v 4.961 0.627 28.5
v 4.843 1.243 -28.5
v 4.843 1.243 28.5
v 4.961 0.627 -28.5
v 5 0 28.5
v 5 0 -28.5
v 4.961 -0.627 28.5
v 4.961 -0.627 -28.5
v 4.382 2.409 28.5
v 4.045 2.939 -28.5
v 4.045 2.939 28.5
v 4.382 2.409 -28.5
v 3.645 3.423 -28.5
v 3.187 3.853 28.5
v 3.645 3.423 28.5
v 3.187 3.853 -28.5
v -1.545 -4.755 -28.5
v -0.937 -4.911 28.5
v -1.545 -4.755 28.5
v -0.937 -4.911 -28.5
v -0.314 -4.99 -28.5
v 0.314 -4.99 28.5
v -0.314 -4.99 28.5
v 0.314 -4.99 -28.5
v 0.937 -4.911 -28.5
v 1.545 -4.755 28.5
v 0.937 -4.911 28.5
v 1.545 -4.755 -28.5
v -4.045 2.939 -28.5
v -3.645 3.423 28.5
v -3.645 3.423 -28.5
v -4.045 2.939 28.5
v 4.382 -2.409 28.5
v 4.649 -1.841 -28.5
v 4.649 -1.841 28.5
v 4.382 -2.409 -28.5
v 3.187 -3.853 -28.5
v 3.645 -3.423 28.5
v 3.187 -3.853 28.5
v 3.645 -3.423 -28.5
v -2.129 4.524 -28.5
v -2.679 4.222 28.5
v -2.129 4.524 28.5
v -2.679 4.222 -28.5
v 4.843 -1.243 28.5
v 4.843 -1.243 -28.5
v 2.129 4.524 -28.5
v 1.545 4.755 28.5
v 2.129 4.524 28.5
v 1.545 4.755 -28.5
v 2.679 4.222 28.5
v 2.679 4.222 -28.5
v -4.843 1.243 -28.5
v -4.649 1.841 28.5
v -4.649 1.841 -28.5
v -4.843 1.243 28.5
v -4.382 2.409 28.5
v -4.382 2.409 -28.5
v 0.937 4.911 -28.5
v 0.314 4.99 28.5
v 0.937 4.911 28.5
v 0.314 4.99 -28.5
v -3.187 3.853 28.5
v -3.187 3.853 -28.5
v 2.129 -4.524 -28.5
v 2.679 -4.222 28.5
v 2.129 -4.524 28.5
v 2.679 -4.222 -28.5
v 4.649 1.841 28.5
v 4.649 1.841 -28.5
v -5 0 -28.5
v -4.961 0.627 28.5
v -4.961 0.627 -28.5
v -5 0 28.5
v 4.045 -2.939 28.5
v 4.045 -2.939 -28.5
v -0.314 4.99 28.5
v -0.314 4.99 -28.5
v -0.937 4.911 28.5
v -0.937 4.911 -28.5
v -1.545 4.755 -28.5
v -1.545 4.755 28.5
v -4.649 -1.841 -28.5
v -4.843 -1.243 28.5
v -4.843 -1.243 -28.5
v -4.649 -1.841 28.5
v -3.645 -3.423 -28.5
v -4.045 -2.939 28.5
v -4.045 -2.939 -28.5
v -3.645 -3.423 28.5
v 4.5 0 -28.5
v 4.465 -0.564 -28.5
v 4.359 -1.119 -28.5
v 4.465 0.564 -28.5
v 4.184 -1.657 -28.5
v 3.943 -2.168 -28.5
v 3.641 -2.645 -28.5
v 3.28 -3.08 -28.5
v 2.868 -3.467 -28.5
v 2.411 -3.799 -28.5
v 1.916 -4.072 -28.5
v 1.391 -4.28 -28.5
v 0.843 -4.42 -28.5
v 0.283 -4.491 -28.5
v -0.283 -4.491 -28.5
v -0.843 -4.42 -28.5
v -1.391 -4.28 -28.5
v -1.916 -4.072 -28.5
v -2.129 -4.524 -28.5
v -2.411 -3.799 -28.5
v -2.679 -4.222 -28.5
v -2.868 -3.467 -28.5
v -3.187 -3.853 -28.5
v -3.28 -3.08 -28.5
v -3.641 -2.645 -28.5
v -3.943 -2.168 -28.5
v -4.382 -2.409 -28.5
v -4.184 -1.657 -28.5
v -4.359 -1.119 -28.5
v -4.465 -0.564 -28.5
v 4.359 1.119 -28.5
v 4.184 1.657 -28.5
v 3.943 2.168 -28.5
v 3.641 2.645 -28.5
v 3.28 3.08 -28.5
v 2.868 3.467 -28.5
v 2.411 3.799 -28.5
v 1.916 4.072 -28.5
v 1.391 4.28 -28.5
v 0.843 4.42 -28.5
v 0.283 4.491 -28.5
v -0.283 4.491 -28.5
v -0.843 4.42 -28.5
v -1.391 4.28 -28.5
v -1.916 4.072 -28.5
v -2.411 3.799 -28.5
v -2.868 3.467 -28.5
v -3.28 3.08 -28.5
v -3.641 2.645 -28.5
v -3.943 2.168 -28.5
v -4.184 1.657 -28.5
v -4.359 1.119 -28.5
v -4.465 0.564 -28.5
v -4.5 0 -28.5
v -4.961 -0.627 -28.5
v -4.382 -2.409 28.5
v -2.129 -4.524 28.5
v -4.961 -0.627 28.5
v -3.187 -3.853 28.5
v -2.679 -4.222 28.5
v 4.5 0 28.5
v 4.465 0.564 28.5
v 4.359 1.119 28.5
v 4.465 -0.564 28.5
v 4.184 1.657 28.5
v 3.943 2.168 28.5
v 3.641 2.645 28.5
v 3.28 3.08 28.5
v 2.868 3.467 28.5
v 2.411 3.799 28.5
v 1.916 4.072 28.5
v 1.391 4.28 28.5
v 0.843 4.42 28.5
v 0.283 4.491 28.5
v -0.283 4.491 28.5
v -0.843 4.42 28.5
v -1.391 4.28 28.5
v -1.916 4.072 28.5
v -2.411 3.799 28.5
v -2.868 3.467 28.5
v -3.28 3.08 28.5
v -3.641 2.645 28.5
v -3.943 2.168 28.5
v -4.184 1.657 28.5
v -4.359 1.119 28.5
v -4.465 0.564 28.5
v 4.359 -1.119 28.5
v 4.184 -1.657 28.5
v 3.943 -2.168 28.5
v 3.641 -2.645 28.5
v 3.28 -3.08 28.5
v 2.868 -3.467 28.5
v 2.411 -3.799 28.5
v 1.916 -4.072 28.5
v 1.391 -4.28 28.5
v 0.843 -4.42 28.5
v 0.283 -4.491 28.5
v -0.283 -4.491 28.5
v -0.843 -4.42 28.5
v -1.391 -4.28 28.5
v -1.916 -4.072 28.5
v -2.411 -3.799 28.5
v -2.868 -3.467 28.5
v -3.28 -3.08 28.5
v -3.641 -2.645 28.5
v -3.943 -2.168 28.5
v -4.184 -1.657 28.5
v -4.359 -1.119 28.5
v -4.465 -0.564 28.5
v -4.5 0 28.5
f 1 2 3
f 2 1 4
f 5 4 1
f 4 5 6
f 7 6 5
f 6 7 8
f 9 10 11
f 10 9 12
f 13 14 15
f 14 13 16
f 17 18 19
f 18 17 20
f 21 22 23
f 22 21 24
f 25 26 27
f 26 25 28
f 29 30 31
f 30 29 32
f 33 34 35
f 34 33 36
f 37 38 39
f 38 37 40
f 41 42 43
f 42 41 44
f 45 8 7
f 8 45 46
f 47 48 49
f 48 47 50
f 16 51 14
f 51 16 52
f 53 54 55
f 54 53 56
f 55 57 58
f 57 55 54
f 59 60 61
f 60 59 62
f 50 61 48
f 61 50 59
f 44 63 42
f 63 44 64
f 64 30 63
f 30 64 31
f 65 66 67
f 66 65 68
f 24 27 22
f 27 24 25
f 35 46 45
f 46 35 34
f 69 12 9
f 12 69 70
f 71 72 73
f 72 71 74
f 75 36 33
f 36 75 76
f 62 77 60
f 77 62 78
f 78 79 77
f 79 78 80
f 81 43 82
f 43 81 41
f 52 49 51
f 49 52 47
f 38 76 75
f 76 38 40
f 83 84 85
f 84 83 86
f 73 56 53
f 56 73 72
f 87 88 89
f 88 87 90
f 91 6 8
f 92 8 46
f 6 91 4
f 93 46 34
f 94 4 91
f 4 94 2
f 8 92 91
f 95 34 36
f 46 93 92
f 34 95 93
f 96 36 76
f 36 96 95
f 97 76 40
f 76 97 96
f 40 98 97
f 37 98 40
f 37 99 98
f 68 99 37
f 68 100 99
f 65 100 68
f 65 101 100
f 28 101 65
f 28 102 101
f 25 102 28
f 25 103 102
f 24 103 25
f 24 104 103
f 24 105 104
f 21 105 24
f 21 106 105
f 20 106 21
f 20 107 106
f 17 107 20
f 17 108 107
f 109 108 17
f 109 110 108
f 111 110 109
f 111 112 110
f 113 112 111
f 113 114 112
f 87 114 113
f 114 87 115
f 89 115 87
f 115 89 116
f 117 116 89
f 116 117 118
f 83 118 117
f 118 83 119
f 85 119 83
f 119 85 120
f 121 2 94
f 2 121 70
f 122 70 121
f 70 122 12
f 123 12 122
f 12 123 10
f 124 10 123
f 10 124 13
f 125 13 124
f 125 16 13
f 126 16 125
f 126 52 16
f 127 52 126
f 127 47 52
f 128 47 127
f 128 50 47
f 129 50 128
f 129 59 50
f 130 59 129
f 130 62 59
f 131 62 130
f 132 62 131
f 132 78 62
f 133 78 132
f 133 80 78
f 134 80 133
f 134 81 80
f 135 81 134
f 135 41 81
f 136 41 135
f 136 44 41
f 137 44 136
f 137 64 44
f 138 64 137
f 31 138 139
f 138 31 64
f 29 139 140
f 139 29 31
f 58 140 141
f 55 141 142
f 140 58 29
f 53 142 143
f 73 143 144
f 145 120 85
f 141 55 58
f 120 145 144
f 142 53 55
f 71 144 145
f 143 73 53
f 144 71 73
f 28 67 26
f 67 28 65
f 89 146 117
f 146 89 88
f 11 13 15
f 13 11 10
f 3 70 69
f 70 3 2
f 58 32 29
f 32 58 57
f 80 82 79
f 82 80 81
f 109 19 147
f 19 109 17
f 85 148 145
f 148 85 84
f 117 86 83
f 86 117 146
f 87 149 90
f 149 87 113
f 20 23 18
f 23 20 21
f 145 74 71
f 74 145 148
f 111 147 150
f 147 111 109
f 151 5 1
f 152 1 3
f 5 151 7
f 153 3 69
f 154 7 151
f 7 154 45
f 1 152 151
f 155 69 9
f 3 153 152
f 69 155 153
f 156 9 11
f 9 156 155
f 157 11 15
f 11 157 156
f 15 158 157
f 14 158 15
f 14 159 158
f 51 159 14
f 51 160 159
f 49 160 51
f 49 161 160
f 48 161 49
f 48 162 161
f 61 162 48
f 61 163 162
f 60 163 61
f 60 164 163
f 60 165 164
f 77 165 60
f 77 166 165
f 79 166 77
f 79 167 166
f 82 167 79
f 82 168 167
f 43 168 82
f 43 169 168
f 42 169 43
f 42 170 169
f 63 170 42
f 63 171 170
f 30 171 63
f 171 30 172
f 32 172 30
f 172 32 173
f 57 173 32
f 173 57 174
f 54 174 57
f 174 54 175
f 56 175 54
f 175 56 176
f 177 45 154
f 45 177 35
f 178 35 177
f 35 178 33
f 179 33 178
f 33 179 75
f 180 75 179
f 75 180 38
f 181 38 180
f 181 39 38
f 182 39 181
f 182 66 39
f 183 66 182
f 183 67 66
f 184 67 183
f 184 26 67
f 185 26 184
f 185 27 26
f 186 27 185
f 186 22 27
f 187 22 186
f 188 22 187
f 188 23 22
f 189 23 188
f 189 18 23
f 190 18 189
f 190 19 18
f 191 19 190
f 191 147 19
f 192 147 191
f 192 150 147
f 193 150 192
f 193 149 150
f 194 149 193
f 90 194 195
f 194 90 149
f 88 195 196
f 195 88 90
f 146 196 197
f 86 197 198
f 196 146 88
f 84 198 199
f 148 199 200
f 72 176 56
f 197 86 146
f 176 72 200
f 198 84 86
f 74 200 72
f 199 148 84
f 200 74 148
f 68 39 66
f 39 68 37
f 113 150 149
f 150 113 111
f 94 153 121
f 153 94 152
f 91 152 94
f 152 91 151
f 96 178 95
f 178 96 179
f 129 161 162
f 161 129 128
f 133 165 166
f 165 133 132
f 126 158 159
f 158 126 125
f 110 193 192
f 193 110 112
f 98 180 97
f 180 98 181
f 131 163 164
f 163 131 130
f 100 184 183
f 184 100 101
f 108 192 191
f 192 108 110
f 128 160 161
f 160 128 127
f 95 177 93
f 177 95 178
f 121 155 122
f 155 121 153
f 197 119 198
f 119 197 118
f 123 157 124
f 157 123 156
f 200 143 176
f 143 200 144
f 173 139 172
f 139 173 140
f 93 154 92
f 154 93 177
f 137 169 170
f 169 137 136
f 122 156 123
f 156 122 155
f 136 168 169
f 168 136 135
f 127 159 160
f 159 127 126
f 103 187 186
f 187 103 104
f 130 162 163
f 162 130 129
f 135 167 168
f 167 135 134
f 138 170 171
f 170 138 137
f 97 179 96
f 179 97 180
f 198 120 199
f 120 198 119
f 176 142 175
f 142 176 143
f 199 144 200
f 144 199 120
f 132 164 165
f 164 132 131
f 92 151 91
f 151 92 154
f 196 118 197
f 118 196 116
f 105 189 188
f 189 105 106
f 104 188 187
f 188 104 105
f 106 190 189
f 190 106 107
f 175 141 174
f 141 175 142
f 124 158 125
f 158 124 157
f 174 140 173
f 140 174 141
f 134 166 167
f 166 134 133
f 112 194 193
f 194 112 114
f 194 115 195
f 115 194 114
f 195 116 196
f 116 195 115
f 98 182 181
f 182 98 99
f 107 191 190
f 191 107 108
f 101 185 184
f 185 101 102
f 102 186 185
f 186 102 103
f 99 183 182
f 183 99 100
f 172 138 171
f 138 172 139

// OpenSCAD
$fn = 50;


difference() {
	union() {
		translate(v = [0, 0, -28.5000000000]) {
			cylinder(h = 57, r = 5.0000000000);
		}
	}
	union() {
		translate(v = [0, 0, -100.0000000000]) {
			cylinder(h = 200, r = 4.5000000000);
		}
	}
}
